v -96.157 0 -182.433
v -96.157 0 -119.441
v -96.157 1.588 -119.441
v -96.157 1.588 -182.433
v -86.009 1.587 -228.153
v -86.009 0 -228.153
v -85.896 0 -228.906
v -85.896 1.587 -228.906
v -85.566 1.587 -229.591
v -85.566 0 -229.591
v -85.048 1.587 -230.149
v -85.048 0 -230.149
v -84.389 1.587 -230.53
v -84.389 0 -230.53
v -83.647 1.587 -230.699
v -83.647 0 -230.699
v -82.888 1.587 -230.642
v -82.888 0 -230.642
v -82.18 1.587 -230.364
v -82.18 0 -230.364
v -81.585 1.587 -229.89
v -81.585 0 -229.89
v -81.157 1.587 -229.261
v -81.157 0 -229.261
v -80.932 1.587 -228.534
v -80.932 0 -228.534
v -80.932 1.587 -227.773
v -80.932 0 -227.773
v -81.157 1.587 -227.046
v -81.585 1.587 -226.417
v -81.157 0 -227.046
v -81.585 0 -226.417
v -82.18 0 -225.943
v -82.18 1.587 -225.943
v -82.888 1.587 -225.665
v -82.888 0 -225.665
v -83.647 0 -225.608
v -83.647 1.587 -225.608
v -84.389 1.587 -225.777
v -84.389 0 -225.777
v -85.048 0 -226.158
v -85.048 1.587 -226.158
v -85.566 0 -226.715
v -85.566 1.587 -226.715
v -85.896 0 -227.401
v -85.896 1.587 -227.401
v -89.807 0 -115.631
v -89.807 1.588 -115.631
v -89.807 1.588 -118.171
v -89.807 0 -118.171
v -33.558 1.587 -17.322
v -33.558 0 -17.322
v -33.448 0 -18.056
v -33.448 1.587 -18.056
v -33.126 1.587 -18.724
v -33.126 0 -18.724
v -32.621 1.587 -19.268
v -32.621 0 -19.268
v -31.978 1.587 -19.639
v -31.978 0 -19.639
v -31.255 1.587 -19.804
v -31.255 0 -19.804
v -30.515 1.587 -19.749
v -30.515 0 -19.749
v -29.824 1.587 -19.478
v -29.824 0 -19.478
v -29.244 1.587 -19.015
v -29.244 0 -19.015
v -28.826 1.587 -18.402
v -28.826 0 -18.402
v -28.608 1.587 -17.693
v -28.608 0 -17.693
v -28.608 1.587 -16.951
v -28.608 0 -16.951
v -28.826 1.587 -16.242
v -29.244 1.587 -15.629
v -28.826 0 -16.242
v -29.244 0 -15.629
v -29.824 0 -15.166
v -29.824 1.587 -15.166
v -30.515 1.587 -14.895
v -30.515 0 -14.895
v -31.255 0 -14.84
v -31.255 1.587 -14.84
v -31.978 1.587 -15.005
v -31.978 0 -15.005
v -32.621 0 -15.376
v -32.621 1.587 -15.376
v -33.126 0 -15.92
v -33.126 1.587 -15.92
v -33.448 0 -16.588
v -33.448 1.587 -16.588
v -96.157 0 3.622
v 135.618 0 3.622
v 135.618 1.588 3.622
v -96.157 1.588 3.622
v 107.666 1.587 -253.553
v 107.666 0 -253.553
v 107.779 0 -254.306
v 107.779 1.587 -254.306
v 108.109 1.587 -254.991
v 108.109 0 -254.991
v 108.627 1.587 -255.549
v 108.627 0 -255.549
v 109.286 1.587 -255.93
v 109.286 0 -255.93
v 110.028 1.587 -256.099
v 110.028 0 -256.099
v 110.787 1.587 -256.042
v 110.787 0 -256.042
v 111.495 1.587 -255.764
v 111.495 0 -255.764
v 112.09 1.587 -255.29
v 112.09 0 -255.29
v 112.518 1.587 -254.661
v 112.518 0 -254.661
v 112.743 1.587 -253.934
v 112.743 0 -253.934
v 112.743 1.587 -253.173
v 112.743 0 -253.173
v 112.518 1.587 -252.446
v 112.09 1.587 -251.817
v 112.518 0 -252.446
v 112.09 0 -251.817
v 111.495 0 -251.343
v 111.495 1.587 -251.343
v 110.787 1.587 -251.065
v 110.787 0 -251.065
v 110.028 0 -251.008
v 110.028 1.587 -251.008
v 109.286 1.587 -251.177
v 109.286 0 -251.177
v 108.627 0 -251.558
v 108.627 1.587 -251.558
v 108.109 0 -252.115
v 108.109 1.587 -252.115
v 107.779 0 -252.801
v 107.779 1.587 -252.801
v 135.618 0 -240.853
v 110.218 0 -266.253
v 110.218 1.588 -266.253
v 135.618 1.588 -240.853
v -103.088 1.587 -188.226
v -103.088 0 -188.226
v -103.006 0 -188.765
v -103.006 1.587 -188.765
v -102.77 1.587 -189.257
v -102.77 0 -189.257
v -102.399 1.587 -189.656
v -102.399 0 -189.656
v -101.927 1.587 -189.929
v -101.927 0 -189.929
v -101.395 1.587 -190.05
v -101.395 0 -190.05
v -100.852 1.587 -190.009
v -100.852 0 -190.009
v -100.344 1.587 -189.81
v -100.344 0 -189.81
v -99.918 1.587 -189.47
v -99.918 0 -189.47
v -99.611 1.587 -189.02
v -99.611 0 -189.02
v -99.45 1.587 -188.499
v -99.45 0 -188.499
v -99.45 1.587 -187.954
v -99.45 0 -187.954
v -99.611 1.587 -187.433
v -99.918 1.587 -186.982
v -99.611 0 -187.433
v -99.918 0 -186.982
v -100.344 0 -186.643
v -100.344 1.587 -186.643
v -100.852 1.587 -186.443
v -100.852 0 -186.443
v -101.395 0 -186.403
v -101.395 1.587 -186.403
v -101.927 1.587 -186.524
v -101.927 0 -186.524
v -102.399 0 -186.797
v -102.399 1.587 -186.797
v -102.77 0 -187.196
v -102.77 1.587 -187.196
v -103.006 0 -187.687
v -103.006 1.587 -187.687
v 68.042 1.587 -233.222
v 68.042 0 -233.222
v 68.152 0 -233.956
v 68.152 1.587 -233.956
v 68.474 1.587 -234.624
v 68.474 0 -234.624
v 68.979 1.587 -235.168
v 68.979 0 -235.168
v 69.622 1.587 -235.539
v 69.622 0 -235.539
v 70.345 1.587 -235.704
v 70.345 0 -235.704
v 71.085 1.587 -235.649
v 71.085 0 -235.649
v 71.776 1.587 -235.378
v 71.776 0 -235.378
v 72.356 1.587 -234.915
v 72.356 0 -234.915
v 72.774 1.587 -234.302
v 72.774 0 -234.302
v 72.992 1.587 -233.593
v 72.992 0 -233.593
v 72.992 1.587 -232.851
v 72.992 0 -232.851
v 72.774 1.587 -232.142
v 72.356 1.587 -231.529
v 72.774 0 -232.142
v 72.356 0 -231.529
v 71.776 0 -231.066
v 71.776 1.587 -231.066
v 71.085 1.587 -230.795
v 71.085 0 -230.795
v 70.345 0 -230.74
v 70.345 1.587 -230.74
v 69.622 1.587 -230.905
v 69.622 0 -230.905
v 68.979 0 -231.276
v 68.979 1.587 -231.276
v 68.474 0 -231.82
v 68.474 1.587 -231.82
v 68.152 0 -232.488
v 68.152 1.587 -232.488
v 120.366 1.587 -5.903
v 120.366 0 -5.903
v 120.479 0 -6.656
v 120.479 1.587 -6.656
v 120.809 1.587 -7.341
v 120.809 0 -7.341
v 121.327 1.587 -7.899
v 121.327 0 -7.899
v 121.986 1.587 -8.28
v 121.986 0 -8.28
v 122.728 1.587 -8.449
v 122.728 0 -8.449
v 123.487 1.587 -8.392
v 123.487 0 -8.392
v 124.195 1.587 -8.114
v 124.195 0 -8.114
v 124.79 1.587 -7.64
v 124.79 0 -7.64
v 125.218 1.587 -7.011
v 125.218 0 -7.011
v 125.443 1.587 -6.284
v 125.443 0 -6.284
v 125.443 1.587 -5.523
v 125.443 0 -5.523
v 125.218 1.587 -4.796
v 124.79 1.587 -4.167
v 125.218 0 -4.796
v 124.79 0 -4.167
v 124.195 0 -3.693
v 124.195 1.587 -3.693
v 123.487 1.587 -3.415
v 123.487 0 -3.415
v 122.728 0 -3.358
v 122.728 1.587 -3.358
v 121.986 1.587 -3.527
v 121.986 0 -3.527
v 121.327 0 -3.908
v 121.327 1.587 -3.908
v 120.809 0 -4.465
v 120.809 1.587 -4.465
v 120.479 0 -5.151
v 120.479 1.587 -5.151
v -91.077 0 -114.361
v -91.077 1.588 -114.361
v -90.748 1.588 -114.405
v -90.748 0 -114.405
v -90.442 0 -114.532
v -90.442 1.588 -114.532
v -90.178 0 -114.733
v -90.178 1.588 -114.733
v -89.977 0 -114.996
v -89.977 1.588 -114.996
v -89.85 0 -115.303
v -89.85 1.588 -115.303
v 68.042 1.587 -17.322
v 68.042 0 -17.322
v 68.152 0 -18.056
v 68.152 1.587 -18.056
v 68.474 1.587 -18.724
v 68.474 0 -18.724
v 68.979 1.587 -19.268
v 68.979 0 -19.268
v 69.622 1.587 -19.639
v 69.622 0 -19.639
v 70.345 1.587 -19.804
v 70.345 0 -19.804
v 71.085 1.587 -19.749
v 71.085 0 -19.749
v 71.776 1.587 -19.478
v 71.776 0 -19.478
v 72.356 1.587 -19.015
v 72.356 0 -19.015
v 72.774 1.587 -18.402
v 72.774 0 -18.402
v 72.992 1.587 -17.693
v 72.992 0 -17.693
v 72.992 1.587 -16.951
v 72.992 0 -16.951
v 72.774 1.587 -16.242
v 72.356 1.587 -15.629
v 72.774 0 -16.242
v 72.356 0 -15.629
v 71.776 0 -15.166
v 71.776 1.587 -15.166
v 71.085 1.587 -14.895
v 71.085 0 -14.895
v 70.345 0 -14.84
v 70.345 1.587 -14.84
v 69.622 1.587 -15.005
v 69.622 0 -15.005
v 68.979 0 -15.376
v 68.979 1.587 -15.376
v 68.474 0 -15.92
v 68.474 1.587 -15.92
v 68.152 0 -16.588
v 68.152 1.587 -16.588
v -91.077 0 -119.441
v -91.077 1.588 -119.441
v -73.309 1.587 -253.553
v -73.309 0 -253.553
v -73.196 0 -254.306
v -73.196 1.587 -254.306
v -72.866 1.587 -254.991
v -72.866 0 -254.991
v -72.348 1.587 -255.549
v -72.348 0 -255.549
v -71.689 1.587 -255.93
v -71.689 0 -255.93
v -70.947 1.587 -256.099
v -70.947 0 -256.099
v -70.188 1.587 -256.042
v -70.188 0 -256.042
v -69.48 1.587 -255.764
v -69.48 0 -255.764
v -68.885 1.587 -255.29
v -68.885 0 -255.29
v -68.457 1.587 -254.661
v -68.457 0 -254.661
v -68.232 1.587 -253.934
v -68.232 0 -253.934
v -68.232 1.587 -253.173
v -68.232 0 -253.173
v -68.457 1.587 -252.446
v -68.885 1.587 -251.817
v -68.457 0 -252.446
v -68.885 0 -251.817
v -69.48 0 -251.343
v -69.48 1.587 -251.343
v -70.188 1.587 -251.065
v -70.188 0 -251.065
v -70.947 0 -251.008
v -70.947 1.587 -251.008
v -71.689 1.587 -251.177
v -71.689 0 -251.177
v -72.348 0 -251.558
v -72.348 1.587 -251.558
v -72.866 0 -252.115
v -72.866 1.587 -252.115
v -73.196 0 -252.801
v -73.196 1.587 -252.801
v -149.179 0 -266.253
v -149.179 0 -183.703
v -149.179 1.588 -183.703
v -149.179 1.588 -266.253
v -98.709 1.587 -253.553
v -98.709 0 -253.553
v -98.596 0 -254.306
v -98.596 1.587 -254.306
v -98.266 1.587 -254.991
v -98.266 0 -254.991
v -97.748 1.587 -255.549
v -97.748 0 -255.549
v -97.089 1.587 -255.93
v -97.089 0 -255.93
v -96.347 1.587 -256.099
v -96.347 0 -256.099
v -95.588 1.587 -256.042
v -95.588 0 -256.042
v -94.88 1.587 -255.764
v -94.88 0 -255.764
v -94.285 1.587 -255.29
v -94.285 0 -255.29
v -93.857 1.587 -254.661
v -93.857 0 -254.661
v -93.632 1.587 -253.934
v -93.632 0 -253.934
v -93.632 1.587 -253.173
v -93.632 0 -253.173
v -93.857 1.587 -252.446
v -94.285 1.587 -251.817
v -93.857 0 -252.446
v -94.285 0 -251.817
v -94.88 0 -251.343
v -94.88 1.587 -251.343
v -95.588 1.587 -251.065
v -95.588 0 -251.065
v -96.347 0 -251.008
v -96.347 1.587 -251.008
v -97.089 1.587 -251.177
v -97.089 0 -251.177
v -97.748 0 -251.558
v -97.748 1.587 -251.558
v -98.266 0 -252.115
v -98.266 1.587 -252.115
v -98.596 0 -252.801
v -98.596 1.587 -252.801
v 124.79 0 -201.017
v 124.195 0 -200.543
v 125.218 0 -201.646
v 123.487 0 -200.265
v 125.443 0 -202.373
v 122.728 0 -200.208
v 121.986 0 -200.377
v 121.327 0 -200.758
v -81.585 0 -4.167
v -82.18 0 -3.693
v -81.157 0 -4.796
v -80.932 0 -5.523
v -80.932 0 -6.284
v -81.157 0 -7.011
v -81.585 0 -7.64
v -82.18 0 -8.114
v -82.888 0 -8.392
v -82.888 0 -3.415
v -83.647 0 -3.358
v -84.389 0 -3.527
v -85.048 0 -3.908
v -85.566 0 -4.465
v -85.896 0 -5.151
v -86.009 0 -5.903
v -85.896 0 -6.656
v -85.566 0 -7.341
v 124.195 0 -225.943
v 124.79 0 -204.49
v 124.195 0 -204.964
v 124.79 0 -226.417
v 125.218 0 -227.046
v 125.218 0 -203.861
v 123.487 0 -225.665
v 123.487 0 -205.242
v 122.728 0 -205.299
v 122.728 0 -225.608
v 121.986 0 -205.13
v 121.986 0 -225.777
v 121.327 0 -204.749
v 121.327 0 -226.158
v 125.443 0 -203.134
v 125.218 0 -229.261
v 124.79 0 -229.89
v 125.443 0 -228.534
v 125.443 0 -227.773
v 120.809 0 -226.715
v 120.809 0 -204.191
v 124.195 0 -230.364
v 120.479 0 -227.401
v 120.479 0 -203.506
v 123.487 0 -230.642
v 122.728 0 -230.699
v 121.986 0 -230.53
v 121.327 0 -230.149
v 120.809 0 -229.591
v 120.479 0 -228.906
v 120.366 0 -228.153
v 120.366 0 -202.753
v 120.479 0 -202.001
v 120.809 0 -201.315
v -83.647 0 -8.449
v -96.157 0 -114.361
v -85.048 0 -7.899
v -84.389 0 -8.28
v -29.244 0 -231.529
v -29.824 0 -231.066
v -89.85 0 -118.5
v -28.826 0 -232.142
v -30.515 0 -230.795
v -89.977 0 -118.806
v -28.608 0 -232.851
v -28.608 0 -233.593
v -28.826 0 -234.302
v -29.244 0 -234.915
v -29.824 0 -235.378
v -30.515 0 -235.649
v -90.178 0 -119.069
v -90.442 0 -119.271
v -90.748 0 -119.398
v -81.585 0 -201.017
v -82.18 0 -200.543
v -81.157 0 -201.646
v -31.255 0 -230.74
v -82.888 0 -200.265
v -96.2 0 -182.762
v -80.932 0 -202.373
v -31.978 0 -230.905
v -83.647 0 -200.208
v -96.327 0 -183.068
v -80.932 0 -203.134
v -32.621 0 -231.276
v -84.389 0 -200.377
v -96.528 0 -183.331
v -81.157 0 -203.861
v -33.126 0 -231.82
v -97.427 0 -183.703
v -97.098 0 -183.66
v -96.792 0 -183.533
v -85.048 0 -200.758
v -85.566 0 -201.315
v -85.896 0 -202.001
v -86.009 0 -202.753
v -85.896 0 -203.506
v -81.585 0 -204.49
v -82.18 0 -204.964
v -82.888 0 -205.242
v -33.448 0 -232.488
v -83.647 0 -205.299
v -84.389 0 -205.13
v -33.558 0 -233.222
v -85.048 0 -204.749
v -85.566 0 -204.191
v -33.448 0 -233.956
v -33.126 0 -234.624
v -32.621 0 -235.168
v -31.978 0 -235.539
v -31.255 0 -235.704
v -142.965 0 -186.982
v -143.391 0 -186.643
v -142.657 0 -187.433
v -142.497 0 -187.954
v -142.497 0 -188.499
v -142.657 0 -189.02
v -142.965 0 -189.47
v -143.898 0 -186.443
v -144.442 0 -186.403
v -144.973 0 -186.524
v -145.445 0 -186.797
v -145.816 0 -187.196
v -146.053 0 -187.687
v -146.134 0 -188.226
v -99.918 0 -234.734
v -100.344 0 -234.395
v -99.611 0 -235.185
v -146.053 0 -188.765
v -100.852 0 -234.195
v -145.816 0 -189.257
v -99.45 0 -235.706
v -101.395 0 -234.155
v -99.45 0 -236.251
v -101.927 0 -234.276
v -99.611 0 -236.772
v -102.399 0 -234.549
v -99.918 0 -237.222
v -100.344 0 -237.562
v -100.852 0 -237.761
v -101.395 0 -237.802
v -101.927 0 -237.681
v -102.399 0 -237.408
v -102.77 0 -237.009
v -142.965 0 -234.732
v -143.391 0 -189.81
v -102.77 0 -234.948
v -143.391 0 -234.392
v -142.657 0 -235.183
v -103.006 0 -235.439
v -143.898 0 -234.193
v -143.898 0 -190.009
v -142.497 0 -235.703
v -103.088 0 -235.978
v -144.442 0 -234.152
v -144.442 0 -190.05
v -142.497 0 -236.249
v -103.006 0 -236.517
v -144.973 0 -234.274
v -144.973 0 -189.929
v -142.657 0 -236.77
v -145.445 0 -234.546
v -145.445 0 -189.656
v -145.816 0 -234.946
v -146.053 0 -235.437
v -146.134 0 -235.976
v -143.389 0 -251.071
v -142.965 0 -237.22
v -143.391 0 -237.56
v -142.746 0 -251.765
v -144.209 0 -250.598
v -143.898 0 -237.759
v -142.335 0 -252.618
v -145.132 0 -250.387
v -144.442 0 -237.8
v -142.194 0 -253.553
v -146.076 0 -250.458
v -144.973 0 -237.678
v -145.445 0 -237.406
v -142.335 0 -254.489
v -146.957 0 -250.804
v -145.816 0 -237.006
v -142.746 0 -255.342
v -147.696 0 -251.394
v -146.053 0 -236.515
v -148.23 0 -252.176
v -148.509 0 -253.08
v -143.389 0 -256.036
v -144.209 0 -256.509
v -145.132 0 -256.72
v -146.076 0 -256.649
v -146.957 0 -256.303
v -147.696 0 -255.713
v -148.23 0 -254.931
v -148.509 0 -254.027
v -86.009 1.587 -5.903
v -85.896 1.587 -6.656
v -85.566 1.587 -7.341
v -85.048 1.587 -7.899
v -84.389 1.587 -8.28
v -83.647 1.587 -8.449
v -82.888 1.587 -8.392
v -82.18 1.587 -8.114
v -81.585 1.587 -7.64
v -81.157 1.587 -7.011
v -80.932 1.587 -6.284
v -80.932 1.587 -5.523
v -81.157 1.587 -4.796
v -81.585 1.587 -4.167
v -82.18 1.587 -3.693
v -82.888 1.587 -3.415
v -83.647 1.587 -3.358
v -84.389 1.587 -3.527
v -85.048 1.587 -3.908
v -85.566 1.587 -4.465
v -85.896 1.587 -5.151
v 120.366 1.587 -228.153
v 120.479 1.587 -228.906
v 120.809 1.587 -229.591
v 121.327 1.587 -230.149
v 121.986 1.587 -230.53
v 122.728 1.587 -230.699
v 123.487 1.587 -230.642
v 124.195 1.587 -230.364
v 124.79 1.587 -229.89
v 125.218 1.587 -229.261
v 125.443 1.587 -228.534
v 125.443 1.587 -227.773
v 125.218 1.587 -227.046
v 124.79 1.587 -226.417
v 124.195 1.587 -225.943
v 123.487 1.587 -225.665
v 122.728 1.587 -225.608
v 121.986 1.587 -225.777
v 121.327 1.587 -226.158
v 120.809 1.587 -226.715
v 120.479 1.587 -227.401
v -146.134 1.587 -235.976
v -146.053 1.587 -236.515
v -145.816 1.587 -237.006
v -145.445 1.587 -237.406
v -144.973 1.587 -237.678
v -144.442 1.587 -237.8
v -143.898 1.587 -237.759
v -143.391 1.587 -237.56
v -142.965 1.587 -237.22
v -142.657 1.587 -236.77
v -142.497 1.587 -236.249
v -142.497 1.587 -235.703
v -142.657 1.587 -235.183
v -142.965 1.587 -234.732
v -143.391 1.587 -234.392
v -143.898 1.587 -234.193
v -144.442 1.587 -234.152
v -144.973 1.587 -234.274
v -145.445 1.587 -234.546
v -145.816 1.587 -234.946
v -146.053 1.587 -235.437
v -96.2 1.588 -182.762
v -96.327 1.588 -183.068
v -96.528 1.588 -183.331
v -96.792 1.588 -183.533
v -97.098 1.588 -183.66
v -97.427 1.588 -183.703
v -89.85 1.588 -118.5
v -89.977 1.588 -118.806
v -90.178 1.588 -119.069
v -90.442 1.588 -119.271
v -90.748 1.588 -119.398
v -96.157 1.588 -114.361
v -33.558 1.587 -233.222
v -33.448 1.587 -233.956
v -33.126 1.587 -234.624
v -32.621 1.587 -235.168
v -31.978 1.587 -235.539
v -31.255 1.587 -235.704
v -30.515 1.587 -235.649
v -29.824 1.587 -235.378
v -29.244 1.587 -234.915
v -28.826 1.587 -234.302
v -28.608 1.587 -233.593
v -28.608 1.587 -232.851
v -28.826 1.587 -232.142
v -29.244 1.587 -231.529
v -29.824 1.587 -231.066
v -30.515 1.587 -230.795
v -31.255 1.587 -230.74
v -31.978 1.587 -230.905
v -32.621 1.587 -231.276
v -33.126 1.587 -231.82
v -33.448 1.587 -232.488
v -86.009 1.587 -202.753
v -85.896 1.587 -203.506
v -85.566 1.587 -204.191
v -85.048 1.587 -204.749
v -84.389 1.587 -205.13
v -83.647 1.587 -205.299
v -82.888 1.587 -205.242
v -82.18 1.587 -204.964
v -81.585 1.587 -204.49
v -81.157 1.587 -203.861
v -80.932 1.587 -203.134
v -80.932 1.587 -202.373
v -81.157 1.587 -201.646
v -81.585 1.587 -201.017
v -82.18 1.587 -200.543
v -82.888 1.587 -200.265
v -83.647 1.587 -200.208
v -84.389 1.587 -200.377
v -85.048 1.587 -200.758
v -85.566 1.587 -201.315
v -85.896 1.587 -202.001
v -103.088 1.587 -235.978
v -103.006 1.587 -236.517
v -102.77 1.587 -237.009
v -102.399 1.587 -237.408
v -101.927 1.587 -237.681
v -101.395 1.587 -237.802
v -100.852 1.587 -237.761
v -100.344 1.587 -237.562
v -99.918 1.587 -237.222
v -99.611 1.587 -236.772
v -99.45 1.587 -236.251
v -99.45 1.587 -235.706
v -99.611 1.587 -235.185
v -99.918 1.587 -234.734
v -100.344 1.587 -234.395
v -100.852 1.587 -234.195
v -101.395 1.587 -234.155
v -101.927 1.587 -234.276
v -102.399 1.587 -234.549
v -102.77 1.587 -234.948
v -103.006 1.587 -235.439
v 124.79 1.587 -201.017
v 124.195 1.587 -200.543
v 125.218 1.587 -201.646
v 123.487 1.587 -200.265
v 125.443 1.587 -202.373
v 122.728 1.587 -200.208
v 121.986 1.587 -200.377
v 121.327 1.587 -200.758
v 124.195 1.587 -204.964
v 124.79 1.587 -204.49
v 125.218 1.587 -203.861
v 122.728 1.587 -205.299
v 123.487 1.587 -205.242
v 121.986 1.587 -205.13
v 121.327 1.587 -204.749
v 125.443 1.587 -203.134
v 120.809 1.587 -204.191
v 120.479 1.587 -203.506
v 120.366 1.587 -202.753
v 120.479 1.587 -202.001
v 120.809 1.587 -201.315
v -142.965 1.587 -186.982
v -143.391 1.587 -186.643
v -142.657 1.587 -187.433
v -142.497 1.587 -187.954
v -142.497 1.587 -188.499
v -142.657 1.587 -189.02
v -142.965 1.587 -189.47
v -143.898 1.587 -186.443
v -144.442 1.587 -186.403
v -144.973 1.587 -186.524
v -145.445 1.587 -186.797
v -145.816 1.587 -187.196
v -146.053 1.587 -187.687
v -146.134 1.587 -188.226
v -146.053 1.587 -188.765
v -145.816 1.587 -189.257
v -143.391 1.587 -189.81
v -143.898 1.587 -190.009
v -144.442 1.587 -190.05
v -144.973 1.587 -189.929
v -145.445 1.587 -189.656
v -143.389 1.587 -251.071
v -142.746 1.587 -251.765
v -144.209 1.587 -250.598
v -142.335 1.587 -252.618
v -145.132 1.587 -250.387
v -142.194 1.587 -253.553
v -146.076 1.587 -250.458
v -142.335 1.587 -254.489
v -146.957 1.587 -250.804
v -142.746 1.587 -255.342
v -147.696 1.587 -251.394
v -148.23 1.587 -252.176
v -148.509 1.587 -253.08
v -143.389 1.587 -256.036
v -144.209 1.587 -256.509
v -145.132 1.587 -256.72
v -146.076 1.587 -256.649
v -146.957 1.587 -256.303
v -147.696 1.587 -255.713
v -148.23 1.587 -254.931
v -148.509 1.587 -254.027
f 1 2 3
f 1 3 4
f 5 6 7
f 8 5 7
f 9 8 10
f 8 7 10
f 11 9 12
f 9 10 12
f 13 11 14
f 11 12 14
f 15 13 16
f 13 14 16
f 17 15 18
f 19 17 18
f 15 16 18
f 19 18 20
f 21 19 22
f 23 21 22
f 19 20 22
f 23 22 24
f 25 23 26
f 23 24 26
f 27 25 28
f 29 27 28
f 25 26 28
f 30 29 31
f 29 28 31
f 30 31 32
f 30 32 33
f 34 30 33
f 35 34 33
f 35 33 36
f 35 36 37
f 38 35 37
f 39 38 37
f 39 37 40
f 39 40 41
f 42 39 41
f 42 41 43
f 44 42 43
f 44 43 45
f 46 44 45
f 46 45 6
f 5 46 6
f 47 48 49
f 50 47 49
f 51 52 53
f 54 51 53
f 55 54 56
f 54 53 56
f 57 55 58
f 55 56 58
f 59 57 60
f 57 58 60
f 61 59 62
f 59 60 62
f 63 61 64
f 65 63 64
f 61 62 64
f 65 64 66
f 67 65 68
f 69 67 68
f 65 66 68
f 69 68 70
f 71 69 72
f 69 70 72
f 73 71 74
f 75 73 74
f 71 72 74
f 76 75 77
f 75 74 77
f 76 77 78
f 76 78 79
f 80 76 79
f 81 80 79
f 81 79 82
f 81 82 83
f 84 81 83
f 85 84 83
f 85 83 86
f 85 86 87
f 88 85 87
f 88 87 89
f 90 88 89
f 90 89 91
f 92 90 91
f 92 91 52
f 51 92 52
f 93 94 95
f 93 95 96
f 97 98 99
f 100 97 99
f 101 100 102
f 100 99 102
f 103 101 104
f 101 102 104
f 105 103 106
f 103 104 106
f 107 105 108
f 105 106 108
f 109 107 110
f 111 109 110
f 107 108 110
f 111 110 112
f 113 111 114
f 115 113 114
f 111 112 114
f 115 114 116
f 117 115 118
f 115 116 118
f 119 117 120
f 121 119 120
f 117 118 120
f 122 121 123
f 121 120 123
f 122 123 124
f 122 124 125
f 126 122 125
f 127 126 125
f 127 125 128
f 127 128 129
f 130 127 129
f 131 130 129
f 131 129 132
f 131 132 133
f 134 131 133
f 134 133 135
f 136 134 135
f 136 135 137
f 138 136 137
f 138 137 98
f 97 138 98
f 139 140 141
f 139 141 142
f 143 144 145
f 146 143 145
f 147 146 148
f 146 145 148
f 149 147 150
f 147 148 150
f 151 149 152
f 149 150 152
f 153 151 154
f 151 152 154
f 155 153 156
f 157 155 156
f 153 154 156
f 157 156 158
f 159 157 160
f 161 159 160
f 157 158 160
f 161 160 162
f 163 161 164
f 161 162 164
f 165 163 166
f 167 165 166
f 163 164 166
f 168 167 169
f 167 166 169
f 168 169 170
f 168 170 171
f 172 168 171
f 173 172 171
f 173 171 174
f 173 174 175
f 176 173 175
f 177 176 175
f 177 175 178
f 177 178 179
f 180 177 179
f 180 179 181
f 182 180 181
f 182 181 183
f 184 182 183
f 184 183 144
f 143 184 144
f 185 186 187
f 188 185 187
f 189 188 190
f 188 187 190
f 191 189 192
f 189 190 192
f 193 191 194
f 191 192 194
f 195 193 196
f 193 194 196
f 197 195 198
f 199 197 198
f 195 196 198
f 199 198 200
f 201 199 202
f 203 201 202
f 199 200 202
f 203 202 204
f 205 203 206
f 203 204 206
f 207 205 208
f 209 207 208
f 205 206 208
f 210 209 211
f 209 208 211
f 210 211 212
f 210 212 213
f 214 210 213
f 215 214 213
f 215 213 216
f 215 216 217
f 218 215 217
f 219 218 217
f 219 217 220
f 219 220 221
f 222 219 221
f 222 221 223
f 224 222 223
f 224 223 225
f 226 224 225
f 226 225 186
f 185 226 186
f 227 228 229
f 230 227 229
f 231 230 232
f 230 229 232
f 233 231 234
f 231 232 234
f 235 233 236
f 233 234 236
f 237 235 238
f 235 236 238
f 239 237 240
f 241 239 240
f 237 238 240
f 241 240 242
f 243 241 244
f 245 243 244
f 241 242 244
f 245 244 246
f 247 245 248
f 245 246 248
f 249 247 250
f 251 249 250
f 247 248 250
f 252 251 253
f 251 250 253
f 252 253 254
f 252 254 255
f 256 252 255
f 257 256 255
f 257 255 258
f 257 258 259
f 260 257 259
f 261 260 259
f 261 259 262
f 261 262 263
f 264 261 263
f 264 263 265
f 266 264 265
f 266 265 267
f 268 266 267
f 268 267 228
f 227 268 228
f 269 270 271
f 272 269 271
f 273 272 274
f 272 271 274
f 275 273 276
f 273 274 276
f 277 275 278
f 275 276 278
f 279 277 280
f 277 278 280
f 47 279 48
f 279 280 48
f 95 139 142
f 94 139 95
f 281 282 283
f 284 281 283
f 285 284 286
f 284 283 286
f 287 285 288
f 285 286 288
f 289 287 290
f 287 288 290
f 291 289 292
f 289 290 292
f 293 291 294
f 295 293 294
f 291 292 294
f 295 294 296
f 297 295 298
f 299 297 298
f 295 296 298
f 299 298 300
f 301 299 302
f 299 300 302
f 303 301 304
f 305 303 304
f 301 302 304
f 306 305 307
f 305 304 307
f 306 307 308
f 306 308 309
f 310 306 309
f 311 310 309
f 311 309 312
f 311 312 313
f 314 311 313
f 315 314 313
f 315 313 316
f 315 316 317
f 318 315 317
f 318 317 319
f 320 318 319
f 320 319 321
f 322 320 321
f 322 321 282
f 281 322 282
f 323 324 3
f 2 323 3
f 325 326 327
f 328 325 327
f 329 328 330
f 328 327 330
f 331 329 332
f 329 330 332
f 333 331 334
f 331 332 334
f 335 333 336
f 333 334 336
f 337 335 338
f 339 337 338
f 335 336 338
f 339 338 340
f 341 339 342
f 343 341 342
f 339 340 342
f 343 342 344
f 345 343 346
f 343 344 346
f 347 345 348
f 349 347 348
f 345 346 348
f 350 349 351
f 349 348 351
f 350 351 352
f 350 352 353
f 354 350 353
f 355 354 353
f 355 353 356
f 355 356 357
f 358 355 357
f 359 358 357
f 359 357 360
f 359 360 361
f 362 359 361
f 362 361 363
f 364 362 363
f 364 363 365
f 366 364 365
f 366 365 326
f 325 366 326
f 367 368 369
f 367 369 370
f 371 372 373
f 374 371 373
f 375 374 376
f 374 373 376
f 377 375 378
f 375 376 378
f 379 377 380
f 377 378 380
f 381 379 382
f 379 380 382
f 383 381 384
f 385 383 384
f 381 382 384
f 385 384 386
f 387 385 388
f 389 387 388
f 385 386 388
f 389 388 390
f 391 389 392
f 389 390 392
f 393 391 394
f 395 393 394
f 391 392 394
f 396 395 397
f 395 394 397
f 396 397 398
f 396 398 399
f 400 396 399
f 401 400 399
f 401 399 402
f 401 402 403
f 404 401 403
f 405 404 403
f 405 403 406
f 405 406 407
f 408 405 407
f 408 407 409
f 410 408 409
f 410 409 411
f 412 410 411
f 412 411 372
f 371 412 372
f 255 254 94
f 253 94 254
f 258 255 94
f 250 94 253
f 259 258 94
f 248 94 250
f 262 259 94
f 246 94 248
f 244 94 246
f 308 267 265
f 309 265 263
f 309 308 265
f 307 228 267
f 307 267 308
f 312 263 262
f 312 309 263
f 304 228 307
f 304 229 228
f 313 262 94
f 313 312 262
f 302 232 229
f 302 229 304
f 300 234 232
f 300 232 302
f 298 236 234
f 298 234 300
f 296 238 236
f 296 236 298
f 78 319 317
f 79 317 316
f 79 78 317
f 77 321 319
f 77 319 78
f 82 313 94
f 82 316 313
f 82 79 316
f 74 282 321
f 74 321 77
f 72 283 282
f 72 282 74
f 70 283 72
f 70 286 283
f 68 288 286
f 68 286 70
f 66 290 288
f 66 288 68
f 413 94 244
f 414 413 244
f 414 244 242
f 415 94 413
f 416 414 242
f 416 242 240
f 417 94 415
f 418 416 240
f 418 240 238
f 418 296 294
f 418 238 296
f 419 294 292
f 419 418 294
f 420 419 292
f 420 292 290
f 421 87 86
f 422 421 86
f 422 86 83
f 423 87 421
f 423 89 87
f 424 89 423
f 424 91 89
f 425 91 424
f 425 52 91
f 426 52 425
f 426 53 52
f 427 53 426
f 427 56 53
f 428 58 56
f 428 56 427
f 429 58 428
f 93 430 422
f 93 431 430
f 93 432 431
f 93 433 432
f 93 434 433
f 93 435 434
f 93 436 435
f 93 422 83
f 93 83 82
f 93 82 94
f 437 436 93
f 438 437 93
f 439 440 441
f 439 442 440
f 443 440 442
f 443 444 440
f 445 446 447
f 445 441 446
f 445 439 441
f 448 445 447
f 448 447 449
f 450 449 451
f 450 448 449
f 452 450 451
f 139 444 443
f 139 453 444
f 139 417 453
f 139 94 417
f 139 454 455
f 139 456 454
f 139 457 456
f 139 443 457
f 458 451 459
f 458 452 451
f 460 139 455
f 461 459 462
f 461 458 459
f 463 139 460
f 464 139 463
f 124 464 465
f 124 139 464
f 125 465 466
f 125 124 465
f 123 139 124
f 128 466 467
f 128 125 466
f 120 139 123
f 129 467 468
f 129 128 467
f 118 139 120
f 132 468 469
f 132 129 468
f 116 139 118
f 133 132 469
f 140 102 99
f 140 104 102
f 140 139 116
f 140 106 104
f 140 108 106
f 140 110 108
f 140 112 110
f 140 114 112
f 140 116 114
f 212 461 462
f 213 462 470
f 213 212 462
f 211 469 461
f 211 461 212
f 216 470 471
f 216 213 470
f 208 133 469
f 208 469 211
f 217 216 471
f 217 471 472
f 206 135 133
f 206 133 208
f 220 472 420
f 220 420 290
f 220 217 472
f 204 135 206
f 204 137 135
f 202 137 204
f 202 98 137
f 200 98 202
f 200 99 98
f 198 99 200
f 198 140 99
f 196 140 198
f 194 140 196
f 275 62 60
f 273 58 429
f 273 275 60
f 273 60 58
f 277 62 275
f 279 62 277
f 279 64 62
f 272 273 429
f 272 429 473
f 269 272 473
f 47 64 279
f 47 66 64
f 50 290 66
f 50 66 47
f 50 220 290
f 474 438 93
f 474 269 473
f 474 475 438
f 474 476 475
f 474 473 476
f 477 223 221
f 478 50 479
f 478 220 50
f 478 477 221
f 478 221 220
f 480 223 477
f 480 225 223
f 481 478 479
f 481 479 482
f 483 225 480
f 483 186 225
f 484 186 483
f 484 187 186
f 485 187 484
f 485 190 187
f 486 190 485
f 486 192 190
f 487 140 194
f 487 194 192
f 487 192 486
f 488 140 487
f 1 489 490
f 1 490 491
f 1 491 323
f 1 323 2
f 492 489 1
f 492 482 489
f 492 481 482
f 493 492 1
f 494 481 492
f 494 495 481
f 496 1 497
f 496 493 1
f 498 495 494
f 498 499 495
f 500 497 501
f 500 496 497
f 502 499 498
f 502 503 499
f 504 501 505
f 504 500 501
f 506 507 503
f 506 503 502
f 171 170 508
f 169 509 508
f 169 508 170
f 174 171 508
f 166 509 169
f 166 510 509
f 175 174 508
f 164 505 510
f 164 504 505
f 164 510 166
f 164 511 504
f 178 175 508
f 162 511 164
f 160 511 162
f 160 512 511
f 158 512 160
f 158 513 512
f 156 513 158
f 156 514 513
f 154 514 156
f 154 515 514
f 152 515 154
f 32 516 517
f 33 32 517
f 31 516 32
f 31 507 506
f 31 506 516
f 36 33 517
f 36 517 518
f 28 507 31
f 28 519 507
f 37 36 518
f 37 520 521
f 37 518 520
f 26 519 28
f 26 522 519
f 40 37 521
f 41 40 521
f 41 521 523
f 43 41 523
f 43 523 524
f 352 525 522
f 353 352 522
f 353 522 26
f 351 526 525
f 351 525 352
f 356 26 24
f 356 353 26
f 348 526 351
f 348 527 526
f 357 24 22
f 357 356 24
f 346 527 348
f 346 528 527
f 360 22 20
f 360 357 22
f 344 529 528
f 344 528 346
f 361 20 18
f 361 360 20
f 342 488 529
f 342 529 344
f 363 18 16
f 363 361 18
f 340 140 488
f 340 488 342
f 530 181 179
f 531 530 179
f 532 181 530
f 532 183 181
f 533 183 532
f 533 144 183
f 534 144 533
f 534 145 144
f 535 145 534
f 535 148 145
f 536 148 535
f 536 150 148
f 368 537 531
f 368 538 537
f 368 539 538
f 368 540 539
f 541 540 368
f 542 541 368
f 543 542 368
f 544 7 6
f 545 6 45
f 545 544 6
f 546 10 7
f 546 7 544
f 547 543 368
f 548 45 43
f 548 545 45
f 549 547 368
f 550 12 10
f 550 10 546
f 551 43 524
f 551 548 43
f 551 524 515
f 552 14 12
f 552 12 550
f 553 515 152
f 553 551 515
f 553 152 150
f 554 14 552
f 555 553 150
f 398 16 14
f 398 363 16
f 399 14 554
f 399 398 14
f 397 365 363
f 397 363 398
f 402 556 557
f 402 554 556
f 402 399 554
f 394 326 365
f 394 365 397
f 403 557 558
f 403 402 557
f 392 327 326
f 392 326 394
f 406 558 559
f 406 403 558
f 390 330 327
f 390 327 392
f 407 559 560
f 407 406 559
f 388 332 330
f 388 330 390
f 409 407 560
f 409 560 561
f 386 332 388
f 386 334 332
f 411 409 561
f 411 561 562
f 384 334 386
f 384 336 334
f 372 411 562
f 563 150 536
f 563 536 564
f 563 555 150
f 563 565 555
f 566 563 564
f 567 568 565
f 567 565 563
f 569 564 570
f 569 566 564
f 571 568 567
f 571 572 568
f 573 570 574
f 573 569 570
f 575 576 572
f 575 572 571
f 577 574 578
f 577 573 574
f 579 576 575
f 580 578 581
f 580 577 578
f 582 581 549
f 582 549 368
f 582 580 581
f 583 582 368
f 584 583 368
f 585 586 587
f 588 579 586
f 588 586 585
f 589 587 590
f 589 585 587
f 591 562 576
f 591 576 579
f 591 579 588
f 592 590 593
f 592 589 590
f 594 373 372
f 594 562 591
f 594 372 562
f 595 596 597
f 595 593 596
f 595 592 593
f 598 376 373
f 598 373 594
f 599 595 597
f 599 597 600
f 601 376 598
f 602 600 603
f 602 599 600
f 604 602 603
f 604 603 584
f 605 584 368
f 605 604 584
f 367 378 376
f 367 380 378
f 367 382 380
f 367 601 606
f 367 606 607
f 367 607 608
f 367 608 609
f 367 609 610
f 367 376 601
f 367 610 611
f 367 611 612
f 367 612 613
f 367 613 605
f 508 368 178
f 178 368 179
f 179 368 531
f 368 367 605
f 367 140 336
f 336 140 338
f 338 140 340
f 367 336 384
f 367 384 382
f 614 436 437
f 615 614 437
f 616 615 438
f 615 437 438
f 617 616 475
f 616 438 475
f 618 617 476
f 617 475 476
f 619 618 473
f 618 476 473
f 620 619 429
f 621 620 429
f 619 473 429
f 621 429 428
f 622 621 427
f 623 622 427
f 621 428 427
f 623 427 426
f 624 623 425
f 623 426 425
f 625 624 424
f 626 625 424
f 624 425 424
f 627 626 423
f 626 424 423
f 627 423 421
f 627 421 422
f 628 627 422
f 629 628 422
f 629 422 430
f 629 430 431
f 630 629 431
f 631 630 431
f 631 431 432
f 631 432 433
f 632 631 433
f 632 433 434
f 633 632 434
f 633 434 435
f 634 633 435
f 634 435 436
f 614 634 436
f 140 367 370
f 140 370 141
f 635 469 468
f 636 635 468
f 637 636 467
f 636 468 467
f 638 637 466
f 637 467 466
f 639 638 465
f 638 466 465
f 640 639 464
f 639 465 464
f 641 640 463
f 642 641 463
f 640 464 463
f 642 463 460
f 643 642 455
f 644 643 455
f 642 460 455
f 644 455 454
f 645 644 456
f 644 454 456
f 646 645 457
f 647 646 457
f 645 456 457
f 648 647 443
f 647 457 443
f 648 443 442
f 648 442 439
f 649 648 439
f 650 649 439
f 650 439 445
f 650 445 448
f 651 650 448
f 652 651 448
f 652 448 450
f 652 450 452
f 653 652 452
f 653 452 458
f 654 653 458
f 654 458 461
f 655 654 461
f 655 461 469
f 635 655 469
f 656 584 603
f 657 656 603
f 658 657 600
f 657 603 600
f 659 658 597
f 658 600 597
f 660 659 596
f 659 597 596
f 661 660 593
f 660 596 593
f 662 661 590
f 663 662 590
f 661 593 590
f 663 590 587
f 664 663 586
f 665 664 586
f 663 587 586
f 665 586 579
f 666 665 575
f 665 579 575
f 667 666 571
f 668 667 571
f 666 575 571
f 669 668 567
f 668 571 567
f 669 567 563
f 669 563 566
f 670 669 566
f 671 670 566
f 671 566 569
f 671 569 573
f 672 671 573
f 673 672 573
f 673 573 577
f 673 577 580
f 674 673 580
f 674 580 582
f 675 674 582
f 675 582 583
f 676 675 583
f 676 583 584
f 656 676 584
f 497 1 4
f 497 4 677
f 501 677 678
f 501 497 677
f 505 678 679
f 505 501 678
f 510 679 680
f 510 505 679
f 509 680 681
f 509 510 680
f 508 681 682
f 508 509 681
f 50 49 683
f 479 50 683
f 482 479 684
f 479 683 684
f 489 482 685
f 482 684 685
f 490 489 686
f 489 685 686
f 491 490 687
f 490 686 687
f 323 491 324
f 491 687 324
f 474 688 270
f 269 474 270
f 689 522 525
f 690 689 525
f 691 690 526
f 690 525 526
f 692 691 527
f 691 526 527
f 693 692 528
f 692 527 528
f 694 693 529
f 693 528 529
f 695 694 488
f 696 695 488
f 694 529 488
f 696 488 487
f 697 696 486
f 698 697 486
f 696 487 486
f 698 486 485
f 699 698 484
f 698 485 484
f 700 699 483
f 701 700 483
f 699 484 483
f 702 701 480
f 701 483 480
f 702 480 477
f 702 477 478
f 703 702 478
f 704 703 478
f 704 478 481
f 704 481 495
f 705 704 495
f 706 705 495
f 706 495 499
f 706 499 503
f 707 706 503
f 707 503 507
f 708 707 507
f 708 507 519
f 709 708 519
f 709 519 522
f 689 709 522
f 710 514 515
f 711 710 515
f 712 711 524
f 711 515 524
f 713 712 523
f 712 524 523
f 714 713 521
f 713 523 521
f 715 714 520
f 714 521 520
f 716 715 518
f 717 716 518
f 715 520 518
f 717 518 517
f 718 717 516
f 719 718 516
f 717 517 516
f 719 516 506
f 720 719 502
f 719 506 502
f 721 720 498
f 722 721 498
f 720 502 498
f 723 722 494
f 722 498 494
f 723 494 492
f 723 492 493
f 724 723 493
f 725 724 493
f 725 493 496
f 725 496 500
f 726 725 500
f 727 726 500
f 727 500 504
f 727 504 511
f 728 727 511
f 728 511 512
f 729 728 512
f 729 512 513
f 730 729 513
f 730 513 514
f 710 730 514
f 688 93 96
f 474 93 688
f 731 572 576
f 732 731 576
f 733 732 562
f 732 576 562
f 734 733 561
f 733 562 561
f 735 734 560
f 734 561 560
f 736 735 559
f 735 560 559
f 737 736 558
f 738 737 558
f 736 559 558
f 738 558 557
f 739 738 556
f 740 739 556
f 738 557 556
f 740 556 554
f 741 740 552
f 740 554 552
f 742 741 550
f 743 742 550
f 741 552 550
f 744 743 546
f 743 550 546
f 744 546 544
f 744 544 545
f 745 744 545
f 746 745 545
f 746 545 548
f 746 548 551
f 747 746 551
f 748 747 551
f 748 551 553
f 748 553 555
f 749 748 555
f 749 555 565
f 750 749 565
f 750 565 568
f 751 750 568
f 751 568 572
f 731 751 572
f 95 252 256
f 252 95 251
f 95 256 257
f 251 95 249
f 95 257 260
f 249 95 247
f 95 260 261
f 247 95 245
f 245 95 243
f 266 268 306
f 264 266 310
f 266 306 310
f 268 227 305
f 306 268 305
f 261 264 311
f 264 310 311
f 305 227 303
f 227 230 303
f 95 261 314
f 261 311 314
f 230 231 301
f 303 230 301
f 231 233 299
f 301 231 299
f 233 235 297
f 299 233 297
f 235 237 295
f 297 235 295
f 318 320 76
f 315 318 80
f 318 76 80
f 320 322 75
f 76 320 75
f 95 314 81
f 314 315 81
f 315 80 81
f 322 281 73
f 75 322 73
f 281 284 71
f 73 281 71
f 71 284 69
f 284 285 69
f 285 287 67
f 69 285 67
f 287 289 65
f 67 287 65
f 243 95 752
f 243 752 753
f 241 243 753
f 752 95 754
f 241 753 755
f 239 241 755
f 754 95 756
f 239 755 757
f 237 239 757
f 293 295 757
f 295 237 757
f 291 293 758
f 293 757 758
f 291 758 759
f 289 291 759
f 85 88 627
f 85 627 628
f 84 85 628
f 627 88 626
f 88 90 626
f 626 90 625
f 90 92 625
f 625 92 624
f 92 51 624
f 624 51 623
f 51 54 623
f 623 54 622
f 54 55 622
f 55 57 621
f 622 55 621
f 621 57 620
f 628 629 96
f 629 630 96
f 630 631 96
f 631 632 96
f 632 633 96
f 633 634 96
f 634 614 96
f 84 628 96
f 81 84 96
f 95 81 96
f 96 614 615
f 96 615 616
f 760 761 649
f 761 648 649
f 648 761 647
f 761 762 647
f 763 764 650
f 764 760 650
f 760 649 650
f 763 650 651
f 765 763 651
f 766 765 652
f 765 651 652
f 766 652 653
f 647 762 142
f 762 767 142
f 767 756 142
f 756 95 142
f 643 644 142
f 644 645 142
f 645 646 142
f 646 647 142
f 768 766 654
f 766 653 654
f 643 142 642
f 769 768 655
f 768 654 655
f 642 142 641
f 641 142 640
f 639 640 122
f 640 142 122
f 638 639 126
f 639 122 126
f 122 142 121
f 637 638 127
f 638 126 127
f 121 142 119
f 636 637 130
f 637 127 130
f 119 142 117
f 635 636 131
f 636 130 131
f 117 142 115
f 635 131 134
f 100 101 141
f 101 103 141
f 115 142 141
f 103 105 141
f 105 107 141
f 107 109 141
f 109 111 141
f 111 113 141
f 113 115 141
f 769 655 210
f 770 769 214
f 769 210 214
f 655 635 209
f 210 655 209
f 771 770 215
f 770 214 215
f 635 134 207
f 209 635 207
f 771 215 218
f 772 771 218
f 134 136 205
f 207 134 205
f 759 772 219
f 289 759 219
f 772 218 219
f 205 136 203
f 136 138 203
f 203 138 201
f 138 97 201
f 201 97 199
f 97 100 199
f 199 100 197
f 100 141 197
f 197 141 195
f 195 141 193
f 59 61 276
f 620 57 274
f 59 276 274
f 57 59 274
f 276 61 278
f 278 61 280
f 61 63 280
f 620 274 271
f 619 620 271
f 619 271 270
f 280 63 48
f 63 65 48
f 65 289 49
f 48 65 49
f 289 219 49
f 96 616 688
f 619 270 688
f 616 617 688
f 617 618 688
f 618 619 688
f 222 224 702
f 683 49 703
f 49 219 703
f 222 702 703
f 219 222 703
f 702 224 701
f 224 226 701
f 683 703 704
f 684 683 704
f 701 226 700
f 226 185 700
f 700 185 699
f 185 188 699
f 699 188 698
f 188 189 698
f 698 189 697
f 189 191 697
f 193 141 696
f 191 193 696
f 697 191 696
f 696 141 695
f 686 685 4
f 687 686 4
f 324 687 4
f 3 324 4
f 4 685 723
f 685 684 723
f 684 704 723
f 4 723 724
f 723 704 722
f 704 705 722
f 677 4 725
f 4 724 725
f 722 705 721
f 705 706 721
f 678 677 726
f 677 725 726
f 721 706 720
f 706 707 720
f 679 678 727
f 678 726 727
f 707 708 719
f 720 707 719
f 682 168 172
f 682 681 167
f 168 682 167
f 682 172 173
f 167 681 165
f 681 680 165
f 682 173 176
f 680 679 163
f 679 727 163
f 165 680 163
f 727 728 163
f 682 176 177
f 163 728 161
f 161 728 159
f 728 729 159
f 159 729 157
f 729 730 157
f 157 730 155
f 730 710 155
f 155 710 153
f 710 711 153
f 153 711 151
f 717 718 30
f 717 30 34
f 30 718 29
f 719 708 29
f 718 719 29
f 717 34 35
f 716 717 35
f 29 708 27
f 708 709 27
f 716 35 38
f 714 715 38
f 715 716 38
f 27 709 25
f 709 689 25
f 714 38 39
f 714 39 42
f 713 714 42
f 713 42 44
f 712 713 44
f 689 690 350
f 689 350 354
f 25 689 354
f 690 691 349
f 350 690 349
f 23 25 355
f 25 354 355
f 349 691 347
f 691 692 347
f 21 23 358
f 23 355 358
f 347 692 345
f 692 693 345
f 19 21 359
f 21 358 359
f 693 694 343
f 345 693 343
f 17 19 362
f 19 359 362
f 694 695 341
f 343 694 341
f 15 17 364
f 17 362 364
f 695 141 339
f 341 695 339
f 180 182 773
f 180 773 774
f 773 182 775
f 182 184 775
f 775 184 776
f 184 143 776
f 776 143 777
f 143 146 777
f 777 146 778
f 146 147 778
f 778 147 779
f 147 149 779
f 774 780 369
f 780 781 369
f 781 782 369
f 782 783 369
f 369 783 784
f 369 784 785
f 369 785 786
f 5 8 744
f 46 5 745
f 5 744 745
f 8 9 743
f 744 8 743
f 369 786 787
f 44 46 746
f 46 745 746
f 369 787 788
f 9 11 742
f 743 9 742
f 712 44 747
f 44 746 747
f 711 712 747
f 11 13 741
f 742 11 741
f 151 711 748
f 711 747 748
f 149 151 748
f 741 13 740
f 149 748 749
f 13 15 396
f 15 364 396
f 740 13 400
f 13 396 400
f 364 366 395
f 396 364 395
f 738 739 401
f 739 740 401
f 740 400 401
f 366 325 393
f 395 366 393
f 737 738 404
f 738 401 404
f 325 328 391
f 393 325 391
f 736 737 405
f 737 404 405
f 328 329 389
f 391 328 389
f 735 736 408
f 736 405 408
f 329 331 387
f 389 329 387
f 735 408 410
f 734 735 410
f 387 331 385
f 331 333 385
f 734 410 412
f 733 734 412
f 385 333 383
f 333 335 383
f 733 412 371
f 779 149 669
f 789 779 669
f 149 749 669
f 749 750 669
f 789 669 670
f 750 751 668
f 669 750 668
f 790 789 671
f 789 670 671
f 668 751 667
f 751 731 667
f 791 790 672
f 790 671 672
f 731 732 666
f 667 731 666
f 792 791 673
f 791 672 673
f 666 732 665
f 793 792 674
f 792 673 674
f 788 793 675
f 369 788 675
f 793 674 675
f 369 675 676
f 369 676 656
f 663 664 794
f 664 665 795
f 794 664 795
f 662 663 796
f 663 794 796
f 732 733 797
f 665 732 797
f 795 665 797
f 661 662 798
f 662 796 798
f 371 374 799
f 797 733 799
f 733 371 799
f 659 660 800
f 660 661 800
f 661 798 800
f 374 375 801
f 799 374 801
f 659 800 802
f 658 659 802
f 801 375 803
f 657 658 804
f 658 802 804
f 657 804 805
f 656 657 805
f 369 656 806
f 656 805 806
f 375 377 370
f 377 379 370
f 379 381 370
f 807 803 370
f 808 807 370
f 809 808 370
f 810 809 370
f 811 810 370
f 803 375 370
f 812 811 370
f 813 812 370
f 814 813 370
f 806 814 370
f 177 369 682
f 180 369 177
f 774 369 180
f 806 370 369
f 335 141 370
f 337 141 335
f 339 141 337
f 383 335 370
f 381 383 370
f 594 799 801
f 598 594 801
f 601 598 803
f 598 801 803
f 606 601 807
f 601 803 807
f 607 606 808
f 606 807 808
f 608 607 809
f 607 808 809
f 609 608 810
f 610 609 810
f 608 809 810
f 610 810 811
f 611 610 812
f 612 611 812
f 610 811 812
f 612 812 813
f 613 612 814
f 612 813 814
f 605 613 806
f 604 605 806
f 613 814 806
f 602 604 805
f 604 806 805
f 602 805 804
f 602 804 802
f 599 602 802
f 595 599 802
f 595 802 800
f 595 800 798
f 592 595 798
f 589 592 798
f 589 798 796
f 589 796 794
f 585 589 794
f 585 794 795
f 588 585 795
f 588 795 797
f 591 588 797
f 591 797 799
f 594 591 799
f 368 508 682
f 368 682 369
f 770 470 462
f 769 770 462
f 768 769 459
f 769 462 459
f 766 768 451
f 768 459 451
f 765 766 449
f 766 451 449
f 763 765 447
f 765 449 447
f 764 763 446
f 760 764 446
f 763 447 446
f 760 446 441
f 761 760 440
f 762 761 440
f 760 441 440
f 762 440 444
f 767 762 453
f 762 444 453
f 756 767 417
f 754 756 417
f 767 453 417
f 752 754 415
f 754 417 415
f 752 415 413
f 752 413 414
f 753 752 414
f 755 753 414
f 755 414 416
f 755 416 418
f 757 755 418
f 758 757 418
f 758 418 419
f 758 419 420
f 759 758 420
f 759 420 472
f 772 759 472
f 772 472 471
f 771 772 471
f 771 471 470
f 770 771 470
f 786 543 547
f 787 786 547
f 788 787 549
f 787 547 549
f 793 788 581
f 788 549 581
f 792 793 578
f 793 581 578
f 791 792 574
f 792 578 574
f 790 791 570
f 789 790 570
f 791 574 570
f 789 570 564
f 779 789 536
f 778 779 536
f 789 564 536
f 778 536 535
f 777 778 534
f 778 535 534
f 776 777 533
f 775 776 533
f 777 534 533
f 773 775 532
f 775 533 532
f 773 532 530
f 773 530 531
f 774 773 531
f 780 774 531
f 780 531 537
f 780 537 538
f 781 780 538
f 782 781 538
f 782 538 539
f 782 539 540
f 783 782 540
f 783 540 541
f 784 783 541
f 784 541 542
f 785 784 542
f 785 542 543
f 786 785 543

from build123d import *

# Parameters (mm, degrees)
BOSS_EXTRUDE1_DEPTH         = 1.5875
F_10_CLEARANCE_HOLE1_D      = 5.1054
F_1_4_0_25_DIAMETER_HOLE1_D = 6.35
F_6_CLEARANCE_HOLE1_D       = 3.6576
CUT_EXTRUDE1_DEPTH          = 306.201250484
F_10_CLEARANCE_HOLE2_D      = 4.9784


with BuildPart() as part:
    # Sketch3 → Boss-Extrude1 (new body)
    with BuildSketch(Plane(origin=(0, 0, 0), x_dir=(1, 0, 0), z_dir=(0, 1, 0))):
        with BuildLine():
            Line((-96.156504648, -3.621534833), (-96.156504648, 182.433465164))
            ThreePointArc((-96.156504648, 182.433465164), (-96.528479036, 183.331490776), (-97.426504648, 183.703465164))
            Line((-97.426504648, 183.703465164), (-149.179004653, 183.703465164))
            Line((-149.179004653, 183.703465164), (-149.179004653, 266.253465164))
            Line((-149.179004653, 266.253465164), (-70.756504695, 266.253465164))
            Line((-70.756504695, 266.253465164), (110.218495881, 266.253465164))
            Line((110.218495881, 266.253465164), (135.618495855, 240.853465164))
            Line((135.618495855, 240.853465164), (135.618495855, -3.621534833))
            Line((135.618495855, -3.621534833), (-96.156504648, -3.621534833))
        make_face()
    extrude(amount=BOSS_EXTRUDE1_DEPTH)

    # #10 Clearance Hole1 (through all)
    with Locations(Plane(origin=(0, 1.5875, 0), x_dir=(1, 0, 0), z_dir=(0, 1, 0))):
        with Locations((-83.456504653, -25.846534328), (-83.456504653, 202.75346618), (-83.456504653, 228.15346618), (-70.756504653, 253.55346618), (122.918495855, 202.753465164), (122.918495855, 228.153465164), (110.218495855, 253.553465164), (-83.456504653, 5.903465672), (122.918495855, 5.903465672), (-96.15650472, 253.553466178)):
            Hole(F_10_CLEARANCE_HOLE1_D / 2)

    # 1/4 (0.25) Diameter Hole1 (through all)
    with Locations(Plane(origin=(0, 0, 0), x_dir=(-1, 0, 0), z_dir=(0, -1, 0))):
        with Locations((145.369004653, 253.553465164)):
            Hole(F_1_4_0_25_DIAMETER_HOLE1_D / 2)

    # #6 Clearance Hole1 (through all)
    with Locations(Plane(origin=(0, 1.5875, 0), x_dir=(1, 0, 0), z_dir=(0, 1, 0))):
        with Locations((-144.305157527, 235.976041671), (-144.305157527, 188.226395138), (-101.258714708, 188.226395138), (-101.258714708, 235.978395138)):
            Hole(F_6_CLEARANCE_HOLE1_D / 2)

    # Sketch17 → Cut-Extrude1 (cut, through all)
    with BuildSketch(Plane(origin=(0, 1.5875, 0), x_dir=(1, 0, 0), z_dir=(0, 1, 0))):
        with BuildLine():
            Line((-96.156504648, 114.361465167), (-91.076504648, 114.361465167))
            ThreePointArc((-91.076504648, 114.361465167), (-90.178479036, 114.733439555), (-89.806504648, 115.631465167))
            Line((-89.806504648, 115.631465167), (-89.806504648, 118.171465167))
            ThreePointArc((-89.806504648, 118.171465167), (-90.178479036, 119.069490779), (-91.076504648, 119.441465167))
            Line((-91.076504648, 119.441465167), (-96.156504648, 119.441465167))
            Line((-96.156504648, 119.441465167), (-96.156504648, 114.361465167))
        make_face()
    extrude(amount=-CUT_EXTRUDE1_DEPTH, mode=Mode.SUBTRACT)

    # #10 Clearance Hole2 (through all)
    with Locations(Plane(origin=(0, 1.5875, 0), x_dir=(1, 0, 0), z_dir=(0, 1, 0))):
        with Locations((-31.069004399, 233.22189625), (70.530995601, 233.22189625), (70.530995601, 17.32189625), (-31.069004399, 17.32189625)):
            Hole(F_10_CLEARANCE_HOLE2_D / 2)


solid = part.part
